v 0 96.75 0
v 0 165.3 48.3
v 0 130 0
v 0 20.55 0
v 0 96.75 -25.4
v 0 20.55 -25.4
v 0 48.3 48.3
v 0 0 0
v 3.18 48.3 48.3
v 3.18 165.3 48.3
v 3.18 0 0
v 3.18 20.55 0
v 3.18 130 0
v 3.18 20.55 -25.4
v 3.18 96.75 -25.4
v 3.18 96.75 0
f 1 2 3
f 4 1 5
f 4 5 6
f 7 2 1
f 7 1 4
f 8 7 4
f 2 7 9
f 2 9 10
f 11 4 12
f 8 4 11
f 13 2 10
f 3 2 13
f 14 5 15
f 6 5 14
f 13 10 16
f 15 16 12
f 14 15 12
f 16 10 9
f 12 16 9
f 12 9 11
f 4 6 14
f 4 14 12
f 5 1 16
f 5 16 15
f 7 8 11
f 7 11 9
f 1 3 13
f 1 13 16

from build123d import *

# Parameters (mm, degrees)
BOSS_EXTRUDE1_DEPTH = 3.18


with BuildPart() as part:
    # Sketch2 → Boss-Extrude1 (new body)
    with BuildSketch(Plane.YZ):
        Polygon((0, 0), (48.3, 48.3), (165.3, 48.3), (130, 0), (96.75, 0), (96.75, -25.4), (20.55, -25.4), (20.55, 0), align=None)
    extrude(amount=BOSS_EXTRUDE1_DEPTH)


solid = part.part
